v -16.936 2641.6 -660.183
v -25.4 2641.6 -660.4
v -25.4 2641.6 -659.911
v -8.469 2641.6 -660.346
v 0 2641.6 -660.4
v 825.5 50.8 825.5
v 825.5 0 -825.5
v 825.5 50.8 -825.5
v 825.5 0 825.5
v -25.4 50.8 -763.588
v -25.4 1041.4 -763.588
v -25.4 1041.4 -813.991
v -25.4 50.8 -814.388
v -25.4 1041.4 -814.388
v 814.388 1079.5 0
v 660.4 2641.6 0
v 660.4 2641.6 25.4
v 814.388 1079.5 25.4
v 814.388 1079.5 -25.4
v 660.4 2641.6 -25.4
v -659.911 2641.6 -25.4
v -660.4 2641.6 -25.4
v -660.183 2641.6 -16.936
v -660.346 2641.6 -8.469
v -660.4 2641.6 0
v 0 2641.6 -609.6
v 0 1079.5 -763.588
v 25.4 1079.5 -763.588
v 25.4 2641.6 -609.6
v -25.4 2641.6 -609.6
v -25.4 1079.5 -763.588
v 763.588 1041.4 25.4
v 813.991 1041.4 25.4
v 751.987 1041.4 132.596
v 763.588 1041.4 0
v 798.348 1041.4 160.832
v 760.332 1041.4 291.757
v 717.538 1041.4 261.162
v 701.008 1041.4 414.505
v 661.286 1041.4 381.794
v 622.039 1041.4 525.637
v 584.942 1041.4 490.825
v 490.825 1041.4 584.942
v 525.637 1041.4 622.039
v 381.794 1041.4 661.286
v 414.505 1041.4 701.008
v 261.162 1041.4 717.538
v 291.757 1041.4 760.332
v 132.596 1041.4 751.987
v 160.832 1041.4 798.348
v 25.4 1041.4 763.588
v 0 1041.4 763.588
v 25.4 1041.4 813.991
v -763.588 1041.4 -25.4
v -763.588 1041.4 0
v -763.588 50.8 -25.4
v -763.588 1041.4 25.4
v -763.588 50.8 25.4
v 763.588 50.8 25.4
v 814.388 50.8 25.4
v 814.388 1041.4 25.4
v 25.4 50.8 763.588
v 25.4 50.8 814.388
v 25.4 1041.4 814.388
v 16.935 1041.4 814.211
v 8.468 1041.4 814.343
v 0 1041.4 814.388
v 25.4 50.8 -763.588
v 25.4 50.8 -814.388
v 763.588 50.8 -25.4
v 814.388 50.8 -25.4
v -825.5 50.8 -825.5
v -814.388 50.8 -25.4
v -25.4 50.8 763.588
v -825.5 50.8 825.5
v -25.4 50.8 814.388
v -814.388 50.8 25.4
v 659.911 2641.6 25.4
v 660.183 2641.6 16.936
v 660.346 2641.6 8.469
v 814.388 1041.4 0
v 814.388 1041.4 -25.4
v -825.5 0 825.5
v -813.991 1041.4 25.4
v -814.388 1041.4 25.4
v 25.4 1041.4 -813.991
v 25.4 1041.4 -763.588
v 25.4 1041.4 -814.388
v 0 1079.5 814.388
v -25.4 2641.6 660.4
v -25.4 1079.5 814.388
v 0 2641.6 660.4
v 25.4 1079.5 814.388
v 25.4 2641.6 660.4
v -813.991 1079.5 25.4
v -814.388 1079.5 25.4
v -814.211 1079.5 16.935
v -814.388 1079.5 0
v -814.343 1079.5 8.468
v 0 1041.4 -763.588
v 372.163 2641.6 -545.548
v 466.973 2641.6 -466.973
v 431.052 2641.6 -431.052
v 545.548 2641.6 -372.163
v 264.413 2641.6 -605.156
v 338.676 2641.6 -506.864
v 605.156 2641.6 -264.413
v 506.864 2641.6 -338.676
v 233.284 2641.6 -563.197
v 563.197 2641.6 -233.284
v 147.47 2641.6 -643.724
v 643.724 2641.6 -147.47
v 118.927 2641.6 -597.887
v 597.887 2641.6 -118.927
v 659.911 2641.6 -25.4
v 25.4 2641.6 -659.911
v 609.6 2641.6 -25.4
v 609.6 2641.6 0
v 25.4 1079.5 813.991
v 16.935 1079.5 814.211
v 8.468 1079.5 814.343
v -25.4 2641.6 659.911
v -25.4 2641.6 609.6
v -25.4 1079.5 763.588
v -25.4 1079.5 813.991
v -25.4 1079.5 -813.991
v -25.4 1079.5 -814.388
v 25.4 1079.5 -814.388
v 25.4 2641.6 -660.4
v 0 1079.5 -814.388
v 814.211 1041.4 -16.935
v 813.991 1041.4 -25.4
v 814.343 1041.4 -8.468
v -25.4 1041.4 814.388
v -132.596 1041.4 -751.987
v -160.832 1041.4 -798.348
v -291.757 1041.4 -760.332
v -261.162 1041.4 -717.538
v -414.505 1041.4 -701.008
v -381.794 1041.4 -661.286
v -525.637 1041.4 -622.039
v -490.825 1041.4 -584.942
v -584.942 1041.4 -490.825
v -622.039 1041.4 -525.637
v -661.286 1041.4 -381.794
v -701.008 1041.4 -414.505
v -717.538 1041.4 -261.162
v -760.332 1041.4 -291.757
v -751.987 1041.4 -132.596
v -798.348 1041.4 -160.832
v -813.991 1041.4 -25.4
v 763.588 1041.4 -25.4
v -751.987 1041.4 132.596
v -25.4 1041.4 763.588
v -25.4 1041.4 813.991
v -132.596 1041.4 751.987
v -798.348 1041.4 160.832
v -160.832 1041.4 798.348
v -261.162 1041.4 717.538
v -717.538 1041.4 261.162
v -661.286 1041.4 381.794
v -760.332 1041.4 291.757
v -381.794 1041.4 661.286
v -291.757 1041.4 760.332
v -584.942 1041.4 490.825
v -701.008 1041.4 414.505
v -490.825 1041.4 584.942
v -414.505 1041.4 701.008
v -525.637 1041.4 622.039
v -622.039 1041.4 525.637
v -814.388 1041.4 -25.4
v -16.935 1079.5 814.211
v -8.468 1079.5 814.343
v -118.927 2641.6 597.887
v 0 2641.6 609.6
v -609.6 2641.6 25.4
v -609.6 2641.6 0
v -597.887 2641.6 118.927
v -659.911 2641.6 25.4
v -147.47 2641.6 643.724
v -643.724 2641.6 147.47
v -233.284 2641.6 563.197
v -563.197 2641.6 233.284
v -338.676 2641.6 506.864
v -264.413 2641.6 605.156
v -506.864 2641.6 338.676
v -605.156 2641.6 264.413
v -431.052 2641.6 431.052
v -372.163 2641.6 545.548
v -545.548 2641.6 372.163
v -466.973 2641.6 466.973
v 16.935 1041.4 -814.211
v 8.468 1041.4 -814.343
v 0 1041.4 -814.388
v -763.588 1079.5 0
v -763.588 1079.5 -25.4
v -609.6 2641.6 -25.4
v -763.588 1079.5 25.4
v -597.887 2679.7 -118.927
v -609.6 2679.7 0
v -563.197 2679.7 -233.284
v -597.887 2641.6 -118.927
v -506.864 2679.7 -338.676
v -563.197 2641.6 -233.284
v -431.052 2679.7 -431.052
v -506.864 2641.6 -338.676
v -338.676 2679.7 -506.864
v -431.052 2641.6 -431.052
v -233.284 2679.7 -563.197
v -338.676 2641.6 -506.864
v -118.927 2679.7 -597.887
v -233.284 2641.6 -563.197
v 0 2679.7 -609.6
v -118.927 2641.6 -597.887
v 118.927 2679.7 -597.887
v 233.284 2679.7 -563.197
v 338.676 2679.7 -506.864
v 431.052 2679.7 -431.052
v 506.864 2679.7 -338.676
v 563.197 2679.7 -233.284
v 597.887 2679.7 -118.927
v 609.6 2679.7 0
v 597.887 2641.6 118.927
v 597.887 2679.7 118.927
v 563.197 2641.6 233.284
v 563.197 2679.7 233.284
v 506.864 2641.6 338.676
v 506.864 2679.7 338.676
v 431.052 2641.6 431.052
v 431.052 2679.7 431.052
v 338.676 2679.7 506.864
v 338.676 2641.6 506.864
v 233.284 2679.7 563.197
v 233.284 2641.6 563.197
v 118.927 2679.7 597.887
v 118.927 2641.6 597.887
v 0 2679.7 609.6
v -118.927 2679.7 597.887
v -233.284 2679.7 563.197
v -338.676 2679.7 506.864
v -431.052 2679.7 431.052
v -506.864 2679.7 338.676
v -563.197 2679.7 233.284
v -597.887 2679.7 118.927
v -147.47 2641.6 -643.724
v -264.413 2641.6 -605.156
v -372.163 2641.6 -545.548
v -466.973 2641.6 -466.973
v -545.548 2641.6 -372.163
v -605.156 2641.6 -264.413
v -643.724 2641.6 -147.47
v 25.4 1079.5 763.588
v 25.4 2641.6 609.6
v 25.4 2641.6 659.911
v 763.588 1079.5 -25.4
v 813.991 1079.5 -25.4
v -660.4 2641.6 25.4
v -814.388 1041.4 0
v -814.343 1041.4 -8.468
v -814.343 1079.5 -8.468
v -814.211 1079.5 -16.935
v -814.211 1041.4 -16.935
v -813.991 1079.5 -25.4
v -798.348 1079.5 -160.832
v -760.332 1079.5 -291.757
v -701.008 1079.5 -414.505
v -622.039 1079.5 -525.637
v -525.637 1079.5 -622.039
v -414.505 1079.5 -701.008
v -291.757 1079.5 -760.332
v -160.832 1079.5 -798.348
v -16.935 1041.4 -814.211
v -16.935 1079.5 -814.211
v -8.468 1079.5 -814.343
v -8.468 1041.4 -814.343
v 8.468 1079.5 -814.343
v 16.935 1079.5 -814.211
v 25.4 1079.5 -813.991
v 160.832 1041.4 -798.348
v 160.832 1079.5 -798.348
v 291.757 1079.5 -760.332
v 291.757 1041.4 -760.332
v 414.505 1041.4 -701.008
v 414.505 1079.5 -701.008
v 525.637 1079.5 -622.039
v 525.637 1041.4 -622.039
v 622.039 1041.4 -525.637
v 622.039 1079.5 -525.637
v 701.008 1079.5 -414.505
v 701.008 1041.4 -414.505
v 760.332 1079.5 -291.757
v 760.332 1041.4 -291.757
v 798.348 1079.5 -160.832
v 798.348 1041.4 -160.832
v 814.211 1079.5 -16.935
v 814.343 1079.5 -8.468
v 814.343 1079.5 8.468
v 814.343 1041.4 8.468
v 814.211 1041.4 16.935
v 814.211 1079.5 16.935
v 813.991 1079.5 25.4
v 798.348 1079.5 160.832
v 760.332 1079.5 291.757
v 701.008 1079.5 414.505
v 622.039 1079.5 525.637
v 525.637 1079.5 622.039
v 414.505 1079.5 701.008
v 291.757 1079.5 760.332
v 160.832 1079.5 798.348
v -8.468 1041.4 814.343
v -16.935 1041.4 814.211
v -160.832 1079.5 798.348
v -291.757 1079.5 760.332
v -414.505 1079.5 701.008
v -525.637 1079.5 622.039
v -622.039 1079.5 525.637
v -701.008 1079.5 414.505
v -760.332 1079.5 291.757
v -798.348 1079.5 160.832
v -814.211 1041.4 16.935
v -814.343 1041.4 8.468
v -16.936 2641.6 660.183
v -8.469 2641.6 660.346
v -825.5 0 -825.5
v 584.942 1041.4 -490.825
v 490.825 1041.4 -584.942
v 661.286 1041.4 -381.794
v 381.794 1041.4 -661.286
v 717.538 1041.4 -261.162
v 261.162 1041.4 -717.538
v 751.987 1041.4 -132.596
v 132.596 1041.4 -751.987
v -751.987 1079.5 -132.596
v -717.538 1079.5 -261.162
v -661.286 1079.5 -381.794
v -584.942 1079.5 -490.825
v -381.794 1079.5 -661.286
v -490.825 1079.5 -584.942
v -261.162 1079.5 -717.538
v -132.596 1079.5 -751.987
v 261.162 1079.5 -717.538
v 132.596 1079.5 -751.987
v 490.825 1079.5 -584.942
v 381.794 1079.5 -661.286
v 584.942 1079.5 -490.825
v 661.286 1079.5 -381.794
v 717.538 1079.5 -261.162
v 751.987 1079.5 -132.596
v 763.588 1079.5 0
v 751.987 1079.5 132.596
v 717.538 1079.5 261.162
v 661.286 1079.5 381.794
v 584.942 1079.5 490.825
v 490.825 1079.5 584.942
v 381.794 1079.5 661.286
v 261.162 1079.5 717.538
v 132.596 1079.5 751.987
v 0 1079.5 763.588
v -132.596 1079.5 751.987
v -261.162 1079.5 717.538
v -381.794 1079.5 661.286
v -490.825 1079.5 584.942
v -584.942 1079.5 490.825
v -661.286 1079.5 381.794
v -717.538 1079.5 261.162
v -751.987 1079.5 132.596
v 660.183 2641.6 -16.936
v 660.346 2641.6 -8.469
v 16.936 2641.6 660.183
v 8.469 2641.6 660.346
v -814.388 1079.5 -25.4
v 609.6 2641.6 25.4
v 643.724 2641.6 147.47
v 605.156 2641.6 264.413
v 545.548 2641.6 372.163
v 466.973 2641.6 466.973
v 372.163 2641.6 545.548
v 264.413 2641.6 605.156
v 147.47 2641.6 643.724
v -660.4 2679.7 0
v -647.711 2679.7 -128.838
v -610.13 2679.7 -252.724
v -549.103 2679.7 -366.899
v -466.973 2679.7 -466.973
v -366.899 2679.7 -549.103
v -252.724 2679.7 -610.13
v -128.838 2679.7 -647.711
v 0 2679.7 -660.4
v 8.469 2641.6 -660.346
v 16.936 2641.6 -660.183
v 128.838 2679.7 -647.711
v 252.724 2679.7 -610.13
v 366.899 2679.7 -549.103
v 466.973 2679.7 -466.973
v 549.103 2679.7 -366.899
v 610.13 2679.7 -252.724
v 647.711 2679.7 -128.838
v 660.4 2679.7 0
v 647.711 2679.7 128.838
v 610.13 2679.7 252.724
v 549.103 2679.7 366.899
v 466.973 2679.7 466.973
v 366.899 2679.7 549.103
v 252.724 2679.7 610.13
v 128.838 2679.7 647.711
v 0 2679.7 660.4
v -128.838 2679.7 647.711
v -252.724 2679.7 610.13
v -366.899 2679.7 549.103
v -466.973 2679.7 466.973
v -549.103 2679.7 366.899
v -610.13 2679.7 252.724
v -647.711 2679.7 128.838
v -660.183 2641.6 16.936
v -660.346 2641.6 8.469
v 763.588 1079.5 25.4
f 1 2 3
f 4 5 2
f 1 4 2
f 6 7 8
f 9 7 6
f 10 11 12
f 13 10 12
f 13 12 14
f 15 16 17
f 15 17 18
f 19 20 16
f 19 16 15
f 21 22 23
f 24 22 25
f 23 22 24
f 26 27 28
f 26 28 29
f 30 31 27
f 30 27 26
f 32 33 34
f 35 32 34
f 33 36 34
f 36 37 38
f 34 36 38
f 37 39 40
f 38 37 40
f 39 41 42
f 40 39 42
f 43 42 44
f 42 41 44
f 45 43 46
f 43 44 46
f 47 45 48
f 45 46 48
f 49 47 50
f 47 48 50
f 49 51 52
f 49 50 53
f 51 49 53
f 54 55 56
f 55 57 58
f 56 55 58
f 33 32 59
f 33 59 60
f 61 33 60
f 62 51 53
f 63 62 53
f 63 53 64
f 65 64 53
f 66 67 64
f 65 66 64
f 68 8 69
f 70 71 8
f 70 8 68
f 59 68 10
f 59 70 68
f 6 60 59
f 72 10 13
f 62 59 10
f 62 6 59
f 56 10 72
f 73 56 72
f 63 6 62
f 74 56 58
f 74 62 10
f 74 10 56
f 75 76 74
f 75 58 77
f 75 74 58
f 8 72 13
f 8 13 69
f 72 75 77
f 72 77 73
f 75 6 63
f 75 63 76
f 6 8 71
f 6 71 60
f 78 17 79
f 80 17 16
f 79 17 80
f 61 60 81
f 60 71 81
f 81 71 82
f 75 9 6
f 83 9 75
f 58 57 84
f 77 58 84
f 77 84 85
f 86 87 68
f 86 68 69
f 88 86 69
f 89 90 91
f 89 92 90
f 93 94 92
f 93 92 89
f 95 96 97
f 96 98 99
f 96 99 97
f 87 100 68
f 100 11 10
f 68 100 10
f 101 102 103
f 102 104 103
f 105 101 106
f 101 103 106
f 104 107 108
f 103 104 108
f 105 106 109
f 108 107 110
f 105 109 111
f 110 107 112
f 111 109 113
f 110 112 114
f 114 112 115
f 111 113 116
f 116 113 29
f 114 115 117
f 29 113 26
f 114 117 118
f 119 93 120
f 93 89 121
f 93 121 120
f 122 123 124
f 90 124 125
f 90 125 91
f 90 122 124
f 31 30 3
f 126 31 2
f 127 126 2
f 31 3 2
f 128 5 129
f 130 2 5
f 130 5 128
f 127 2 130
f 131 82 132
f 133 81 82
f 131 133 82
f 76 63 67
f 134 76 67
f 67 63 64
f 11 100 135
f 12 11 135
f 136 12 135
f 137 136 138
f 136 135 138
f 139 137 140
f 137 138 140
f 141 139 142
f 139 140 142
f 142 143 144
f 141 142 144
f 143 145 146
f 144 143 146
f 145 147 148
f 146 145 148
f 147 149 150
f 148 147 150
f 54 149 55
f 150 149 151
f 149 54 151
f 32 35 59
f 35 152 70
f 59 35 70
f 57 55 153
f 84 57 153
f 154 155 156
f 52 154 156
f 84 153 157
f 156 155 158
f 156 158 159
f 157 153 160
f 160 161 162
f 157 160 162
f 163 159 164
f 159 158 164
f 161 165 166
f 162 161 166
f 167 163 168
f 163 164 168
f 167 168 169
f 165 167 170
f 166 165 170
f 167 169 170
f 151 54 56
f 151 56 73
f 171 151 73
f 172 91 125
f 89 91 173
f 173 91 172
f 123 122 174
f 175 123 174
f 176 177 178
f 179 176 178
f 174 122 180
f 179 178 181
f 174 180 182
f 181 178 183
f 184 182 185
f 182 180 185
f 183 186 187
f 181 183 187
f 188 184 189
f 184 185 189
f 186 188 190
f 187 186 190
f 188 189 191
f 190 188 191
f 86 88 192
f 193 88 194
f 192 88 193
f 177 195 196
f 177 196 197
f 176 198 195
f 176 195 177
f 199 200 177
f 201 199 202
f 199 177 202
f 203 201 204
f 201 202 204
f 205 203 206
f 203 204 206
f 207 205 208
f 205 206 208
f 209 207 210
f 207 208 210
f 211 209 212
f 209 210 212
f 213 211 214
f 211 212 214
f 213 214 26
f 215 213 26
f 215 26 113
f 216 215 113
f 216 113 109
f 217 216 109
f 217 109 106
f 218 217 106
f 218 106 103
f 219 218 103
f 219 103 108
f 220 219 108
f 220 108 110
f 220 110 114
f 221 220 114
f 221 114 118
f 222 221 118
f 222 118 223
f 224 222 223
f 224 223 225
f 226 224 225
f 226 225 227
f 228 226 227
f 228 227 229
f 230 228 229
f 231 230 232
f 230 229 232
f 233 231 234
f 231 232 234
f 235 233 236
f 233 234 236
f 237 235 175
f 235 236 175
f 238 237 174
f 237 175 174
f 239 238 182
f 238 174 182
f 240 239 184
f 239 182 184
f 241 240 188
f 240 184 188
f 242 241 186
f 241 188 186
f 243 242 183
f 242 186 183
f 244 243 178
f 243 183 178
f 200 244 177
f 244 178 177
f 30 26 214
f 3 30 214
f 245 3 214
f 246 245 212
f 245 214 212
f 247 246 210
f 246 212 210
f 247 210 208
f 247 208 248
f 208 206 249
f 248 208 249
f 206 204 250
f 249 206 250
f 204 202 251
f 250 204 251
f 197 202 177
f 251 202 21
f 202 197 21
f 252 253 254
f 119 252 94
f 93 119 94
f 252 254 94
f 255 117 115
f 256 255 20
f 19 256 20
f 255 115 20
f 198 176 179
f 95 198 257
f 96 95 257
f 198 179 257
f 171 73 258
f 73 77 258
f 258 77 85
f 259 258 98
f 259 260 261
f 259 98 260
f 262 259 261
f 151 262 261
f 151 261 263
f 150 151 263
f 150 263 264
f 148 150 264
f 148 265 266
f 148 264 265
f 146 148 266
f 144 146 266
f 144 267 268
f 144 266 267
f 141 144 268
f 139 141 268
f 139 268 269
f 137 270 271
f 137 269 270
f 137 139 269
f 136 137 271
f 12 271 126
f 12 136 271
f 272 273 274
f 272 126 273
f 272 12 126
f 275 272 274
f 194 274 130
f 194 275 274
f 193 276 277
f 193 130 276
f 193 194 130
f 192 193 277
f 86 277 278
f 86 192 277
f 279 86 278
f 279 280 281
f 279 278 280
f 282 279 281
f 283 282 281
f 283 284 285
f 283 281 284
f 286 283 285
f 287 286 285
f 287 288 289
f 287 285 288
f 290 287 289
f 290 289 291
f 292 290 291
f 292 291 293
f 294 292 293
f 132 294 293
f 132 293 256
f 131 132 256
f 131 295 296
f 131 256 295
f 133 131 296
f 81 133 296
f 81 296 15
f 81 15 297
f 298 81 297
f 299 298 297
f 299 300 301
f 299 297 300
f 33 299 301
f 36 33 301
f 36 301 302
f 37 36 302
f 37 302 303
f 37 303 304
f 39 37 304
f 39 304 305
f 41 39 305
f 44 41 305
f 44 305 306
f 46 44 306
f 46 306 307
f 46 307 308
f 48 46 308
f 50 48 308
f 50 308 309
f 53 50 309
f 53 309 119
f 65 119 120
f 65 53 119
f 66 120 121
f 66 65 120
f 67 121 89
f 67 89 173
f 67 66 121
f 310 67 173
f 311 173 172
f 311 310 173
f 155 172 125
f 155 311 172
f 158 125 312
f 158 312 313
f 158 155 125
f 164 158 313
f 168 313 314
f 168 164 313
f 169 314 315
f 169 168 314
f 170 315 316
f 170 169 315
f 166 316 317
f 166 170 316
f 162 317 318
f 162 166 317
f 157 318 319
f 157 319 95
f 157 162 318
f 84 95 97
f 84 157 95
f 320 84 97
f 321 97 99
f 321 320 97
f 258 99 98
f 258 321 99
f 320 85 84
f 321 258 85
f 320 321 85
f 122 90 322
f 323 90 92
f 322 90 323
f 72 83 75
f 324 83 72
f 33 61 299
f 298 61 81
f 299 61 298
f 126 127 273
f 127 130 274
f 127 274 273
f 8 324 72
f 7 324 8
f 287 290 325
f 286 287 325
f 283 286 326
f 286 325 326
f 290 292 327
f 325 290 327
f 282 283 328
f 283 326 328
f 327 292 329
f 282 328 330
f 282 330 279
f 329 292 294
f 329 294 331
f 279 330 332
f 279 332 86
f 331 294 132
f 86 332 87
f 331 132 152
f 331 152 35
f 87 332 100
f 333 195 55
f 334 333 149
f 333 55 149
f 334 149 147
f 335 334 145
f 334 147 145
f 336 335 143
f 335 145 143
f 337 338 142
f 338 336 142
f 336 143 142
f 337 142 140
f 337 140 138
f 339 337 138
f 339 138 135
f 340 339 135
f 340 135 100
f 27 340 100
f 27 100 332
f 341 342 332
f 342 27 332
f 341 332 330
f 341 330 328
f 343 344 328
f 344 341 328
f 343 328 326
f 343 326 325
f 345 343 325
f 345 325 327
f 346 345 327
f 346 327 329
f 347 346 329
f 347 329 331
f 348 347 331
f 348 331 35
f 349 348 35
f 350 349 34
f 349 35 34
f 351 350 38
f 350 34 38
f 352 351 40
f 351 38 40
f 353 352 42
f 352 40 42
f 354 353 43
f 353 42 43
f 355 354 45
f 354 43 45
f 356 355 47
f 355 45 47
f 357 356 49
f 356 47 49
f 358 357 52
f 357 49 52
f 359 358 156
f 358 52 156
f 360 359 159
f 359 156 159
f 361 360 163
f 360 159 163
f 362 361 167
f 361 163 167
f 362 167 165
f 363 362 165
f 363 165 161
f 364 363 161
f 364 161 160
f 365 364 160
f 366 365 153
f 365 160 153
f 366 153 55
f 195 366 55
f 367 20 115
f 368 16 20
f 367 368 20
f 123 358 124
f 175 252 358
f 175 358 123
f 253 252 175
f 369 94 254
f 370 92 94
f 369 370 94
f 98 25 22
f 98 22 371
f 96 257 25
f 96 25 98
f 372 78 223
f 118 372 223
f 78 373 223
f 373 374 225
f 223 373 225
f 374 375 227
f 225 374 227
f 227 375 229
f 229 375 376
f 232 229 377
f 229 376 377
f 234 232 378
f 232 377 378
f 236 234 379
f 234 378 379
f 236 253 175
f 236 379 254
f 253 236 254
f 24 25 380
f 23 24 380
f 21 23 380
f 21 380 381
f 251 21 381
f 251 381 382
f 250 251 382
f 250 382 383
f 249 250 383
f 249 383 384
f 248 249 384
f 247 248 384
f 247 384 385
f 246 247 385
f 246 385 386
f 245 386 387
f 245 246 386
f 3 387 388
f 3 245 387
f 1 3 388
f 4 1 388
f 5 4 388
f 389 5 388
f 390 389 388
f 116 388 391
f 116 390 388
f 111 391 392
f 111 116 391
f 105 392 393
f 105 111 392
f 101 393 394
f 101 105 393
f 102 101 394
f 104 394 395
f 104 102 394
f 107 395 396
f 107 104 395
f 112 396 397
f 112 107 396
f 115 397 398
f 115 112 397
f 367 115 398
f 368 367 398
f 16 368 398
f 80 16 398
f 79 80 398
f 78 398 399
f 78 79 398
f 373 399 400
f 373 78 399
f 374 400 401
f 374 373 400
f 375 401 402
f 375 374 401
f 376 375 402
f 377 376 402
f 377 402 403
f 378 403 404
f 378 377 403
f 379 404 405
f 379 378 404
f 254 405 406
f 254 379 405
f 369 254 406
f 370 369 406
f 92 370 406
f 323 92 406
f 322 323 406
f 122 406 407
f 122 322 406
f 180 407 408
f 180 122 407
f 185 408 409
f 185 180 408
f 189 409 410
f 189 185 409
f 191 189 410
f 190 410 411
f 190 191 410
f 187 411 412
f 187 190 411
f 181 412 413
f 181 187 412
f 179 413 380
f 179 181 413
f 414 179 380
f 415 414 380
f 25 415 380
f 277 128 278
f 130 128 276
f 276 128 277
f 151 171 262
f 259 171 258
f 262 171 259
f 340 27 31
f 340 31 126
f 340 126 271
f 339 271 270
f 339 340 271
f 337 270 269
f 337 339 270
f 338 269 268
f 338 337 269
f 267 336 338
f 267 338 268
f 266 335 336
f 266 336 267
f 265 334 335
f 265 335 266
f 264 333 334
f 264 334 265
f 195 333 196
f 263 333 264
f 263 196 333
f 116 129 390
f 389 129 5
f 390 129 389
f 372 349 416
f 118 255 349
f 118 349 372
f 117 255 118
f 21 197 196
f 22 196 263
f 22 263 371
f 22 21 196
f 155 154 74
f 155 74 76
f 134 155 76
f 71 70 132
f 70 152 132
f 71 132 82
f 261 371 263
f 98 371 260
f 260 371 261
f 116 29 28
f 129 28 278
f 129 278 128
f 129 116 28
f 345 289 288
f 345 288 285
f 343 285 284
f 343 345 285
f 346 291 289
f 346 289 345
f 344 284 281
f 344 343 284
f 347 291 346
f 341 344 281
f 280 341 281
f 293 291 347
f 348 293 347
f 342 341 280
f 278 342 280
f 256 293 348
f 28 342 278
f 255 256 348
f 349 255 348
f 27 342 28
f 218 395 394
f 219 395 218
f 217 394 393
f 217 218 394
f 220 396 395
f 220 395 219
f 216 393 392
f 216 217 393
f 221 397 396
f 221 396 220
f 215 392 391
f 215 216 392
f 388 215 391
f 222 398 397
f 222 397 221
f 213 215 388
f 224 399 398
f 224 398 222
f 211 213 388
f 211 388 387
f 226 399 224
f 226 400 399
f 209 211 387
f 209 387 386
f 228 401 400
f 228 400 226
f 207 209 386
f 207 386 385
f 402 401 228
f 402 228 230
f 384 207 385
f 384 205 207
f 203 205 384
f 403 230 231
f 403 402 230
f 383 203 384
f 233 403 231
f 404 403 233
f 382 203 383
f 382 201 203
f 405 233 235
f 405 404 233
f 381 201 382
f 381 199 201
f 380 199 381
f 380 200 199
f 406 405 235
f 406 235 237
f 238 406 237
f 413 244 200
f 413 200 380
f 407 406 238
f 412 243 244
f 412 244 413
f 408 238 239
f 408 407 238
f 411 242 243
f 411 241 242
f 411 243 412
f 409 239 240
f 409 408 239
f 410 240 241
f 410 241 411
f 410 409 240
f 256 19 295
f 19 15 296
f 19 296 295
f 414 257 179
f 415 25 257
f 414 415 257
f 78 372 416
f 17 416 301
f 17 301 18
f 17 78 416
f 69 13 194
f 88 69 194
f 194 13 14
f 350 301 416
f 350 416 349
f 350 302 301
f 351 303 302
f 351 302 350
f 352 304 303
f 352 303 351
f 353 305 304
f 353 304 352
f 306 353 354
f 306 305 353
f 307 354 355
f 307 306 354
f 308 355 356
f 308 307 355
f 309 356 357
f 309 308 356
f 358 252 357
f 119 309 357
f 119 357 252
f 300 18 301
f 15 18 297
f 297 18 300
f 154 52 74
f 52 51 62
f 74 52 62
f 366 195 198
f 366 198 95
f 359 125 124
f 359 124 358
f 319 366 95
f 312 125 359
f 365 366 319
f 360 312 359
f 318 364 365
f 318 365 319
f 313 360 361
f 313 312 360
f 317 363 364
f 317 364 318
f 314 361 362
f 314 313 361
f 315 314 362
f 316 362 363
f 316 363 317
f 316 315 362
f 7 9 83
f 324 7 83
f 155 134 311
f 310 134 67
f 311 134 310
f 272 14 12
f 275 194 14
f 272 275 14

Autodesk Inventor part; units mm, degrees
ref_plane "YZ Plane" through (0, 0, 0) normal (1, 0, 0) x (0, 1, 0)
ref_plane "Work Plane1" through (0, 2641.6, 0) normal (0, 1, 0) x (-1, 0, 0)
sketch "Sketch1" plane through (0, 2641.6, 0) normal (0, 1, 0) x (-1, 0, 0)
  circle A0 centre (0, 0) radius 609.6
  circle A1 centre (0, 0) radius 660.4
  line L0 (0, 660.4) -> (0, 609.6)
  line L1 (-609.6, 0) -> (-660.4, 0)
  dimension "d1" = 1219.2
  dimension "d2" = 1320.8
extrude "Extrusion1" add sketch "Sketch1" along normal blind 38.1 contours A0 L0 A1 L1 | A0 L1 A1 L0
ref_plane "Work Plane2" through (0, 1041.4, 0) normal (0, 1, 0) x (-1, 0, 0)
sketch "Sketch2" plane through (0, 1041.4, 0) normal (0, 1, 0) x (-1, 0, 0)
  circle A0 centre (0, 0) radius 763.5875
  circle A1 centre (0, 0) radius 814.3875
  line L0 (0, 763.5875) -> (0, 814.3875)
  dimension "d6" = 1527.175
  dimension "d7" = 1628.775
extrude "Extrusion2" add sketch "Sketch2" along normal blind 38.1
sketch "Sketch3" plane through (0, 0, 0) normal (0, 0, 1) x (1, 0, 0)
  line L0 (814.3875, 1079.5) -> (-814.3875, 1079.5) projected
  line L1 (763.5875, 1079.5) -> (814.3875, 1079.5)
  line L2 (660.4, 2641.6) -> (-660.4, 2641.6) projected
  line L3 (609.6, 2641.6) -> (660.4, 2641.6)
  line L4 (660.4, 2641.6) -> (814.3875, 1079.5)
  line L5 (763.5875, 1079.5) -> (609.6, 2641.6)
  point P0 (0, 0)
extrude "Extrusion3" add sketch "Sketch3" along normal mid plane 50.8
pattern_circular "Circular Pattern1" count 4 over 360 about axis through (0, -10, 0) along (0, 1, 0) of "Extrusion3"
sketch "Sketch4" plane through (0, 0, 0) normal (0, 1, 0) x (-1, 0, 0)
  line L0 (825.5, -825.5) -> (-825.5, -825.5)
  line L1 (-825.5, -825.5) -> (-825.5, 825.5)
  line L2 (-825.5, 825.5) -> (825.5, 825.5)
  line L3 (825.5, 825.5) -> (825.5, -825.5)
  line L4 (825.5, -825.5) -> (-825.5, 825.5) construction
  line L5 (-825.5, -825.5) -> (825.5, 825.5) construction
  point P0 (0, 0)
  dimension "d15" = 1651
  dimension "d16" = 1651
extrude "Extrusion4" add sketch "Sketch4" along normal blind 50.8
sketch "Sketch5" plane through (0, 0, 0) normal (0, 0, 1) x (1, 0, 0)
  line L0 (814.3875, 1041.4) -> (-814.3875, 1041.4) projected
  line L1 (-825.5, 50.8) -> (825.5, 50.8) projected
  line L2 (814.3875, 1041.4) -> (763.5875, 1041.4)
  line L3 (763.5875, 1041.4) -> (763.5875, 50.8)
  line L4 (763.5875, 50.8) -> (814.3875, 50.8)
  line L5 (814.3875, 50.8) -> (814.3875, 1041.4)
  point P0 (0, 0)
  dimension "d19" = 50.8
extrude "Extrusion5" add sketch "Sketch5" along normal mid plane 50.8
pattern_circular "Circular Pattern2" count 4 over 360 about axis through (0, -10, 0) along (0, 1, 0) of "Extrusion5"
properties part number "Hub"
